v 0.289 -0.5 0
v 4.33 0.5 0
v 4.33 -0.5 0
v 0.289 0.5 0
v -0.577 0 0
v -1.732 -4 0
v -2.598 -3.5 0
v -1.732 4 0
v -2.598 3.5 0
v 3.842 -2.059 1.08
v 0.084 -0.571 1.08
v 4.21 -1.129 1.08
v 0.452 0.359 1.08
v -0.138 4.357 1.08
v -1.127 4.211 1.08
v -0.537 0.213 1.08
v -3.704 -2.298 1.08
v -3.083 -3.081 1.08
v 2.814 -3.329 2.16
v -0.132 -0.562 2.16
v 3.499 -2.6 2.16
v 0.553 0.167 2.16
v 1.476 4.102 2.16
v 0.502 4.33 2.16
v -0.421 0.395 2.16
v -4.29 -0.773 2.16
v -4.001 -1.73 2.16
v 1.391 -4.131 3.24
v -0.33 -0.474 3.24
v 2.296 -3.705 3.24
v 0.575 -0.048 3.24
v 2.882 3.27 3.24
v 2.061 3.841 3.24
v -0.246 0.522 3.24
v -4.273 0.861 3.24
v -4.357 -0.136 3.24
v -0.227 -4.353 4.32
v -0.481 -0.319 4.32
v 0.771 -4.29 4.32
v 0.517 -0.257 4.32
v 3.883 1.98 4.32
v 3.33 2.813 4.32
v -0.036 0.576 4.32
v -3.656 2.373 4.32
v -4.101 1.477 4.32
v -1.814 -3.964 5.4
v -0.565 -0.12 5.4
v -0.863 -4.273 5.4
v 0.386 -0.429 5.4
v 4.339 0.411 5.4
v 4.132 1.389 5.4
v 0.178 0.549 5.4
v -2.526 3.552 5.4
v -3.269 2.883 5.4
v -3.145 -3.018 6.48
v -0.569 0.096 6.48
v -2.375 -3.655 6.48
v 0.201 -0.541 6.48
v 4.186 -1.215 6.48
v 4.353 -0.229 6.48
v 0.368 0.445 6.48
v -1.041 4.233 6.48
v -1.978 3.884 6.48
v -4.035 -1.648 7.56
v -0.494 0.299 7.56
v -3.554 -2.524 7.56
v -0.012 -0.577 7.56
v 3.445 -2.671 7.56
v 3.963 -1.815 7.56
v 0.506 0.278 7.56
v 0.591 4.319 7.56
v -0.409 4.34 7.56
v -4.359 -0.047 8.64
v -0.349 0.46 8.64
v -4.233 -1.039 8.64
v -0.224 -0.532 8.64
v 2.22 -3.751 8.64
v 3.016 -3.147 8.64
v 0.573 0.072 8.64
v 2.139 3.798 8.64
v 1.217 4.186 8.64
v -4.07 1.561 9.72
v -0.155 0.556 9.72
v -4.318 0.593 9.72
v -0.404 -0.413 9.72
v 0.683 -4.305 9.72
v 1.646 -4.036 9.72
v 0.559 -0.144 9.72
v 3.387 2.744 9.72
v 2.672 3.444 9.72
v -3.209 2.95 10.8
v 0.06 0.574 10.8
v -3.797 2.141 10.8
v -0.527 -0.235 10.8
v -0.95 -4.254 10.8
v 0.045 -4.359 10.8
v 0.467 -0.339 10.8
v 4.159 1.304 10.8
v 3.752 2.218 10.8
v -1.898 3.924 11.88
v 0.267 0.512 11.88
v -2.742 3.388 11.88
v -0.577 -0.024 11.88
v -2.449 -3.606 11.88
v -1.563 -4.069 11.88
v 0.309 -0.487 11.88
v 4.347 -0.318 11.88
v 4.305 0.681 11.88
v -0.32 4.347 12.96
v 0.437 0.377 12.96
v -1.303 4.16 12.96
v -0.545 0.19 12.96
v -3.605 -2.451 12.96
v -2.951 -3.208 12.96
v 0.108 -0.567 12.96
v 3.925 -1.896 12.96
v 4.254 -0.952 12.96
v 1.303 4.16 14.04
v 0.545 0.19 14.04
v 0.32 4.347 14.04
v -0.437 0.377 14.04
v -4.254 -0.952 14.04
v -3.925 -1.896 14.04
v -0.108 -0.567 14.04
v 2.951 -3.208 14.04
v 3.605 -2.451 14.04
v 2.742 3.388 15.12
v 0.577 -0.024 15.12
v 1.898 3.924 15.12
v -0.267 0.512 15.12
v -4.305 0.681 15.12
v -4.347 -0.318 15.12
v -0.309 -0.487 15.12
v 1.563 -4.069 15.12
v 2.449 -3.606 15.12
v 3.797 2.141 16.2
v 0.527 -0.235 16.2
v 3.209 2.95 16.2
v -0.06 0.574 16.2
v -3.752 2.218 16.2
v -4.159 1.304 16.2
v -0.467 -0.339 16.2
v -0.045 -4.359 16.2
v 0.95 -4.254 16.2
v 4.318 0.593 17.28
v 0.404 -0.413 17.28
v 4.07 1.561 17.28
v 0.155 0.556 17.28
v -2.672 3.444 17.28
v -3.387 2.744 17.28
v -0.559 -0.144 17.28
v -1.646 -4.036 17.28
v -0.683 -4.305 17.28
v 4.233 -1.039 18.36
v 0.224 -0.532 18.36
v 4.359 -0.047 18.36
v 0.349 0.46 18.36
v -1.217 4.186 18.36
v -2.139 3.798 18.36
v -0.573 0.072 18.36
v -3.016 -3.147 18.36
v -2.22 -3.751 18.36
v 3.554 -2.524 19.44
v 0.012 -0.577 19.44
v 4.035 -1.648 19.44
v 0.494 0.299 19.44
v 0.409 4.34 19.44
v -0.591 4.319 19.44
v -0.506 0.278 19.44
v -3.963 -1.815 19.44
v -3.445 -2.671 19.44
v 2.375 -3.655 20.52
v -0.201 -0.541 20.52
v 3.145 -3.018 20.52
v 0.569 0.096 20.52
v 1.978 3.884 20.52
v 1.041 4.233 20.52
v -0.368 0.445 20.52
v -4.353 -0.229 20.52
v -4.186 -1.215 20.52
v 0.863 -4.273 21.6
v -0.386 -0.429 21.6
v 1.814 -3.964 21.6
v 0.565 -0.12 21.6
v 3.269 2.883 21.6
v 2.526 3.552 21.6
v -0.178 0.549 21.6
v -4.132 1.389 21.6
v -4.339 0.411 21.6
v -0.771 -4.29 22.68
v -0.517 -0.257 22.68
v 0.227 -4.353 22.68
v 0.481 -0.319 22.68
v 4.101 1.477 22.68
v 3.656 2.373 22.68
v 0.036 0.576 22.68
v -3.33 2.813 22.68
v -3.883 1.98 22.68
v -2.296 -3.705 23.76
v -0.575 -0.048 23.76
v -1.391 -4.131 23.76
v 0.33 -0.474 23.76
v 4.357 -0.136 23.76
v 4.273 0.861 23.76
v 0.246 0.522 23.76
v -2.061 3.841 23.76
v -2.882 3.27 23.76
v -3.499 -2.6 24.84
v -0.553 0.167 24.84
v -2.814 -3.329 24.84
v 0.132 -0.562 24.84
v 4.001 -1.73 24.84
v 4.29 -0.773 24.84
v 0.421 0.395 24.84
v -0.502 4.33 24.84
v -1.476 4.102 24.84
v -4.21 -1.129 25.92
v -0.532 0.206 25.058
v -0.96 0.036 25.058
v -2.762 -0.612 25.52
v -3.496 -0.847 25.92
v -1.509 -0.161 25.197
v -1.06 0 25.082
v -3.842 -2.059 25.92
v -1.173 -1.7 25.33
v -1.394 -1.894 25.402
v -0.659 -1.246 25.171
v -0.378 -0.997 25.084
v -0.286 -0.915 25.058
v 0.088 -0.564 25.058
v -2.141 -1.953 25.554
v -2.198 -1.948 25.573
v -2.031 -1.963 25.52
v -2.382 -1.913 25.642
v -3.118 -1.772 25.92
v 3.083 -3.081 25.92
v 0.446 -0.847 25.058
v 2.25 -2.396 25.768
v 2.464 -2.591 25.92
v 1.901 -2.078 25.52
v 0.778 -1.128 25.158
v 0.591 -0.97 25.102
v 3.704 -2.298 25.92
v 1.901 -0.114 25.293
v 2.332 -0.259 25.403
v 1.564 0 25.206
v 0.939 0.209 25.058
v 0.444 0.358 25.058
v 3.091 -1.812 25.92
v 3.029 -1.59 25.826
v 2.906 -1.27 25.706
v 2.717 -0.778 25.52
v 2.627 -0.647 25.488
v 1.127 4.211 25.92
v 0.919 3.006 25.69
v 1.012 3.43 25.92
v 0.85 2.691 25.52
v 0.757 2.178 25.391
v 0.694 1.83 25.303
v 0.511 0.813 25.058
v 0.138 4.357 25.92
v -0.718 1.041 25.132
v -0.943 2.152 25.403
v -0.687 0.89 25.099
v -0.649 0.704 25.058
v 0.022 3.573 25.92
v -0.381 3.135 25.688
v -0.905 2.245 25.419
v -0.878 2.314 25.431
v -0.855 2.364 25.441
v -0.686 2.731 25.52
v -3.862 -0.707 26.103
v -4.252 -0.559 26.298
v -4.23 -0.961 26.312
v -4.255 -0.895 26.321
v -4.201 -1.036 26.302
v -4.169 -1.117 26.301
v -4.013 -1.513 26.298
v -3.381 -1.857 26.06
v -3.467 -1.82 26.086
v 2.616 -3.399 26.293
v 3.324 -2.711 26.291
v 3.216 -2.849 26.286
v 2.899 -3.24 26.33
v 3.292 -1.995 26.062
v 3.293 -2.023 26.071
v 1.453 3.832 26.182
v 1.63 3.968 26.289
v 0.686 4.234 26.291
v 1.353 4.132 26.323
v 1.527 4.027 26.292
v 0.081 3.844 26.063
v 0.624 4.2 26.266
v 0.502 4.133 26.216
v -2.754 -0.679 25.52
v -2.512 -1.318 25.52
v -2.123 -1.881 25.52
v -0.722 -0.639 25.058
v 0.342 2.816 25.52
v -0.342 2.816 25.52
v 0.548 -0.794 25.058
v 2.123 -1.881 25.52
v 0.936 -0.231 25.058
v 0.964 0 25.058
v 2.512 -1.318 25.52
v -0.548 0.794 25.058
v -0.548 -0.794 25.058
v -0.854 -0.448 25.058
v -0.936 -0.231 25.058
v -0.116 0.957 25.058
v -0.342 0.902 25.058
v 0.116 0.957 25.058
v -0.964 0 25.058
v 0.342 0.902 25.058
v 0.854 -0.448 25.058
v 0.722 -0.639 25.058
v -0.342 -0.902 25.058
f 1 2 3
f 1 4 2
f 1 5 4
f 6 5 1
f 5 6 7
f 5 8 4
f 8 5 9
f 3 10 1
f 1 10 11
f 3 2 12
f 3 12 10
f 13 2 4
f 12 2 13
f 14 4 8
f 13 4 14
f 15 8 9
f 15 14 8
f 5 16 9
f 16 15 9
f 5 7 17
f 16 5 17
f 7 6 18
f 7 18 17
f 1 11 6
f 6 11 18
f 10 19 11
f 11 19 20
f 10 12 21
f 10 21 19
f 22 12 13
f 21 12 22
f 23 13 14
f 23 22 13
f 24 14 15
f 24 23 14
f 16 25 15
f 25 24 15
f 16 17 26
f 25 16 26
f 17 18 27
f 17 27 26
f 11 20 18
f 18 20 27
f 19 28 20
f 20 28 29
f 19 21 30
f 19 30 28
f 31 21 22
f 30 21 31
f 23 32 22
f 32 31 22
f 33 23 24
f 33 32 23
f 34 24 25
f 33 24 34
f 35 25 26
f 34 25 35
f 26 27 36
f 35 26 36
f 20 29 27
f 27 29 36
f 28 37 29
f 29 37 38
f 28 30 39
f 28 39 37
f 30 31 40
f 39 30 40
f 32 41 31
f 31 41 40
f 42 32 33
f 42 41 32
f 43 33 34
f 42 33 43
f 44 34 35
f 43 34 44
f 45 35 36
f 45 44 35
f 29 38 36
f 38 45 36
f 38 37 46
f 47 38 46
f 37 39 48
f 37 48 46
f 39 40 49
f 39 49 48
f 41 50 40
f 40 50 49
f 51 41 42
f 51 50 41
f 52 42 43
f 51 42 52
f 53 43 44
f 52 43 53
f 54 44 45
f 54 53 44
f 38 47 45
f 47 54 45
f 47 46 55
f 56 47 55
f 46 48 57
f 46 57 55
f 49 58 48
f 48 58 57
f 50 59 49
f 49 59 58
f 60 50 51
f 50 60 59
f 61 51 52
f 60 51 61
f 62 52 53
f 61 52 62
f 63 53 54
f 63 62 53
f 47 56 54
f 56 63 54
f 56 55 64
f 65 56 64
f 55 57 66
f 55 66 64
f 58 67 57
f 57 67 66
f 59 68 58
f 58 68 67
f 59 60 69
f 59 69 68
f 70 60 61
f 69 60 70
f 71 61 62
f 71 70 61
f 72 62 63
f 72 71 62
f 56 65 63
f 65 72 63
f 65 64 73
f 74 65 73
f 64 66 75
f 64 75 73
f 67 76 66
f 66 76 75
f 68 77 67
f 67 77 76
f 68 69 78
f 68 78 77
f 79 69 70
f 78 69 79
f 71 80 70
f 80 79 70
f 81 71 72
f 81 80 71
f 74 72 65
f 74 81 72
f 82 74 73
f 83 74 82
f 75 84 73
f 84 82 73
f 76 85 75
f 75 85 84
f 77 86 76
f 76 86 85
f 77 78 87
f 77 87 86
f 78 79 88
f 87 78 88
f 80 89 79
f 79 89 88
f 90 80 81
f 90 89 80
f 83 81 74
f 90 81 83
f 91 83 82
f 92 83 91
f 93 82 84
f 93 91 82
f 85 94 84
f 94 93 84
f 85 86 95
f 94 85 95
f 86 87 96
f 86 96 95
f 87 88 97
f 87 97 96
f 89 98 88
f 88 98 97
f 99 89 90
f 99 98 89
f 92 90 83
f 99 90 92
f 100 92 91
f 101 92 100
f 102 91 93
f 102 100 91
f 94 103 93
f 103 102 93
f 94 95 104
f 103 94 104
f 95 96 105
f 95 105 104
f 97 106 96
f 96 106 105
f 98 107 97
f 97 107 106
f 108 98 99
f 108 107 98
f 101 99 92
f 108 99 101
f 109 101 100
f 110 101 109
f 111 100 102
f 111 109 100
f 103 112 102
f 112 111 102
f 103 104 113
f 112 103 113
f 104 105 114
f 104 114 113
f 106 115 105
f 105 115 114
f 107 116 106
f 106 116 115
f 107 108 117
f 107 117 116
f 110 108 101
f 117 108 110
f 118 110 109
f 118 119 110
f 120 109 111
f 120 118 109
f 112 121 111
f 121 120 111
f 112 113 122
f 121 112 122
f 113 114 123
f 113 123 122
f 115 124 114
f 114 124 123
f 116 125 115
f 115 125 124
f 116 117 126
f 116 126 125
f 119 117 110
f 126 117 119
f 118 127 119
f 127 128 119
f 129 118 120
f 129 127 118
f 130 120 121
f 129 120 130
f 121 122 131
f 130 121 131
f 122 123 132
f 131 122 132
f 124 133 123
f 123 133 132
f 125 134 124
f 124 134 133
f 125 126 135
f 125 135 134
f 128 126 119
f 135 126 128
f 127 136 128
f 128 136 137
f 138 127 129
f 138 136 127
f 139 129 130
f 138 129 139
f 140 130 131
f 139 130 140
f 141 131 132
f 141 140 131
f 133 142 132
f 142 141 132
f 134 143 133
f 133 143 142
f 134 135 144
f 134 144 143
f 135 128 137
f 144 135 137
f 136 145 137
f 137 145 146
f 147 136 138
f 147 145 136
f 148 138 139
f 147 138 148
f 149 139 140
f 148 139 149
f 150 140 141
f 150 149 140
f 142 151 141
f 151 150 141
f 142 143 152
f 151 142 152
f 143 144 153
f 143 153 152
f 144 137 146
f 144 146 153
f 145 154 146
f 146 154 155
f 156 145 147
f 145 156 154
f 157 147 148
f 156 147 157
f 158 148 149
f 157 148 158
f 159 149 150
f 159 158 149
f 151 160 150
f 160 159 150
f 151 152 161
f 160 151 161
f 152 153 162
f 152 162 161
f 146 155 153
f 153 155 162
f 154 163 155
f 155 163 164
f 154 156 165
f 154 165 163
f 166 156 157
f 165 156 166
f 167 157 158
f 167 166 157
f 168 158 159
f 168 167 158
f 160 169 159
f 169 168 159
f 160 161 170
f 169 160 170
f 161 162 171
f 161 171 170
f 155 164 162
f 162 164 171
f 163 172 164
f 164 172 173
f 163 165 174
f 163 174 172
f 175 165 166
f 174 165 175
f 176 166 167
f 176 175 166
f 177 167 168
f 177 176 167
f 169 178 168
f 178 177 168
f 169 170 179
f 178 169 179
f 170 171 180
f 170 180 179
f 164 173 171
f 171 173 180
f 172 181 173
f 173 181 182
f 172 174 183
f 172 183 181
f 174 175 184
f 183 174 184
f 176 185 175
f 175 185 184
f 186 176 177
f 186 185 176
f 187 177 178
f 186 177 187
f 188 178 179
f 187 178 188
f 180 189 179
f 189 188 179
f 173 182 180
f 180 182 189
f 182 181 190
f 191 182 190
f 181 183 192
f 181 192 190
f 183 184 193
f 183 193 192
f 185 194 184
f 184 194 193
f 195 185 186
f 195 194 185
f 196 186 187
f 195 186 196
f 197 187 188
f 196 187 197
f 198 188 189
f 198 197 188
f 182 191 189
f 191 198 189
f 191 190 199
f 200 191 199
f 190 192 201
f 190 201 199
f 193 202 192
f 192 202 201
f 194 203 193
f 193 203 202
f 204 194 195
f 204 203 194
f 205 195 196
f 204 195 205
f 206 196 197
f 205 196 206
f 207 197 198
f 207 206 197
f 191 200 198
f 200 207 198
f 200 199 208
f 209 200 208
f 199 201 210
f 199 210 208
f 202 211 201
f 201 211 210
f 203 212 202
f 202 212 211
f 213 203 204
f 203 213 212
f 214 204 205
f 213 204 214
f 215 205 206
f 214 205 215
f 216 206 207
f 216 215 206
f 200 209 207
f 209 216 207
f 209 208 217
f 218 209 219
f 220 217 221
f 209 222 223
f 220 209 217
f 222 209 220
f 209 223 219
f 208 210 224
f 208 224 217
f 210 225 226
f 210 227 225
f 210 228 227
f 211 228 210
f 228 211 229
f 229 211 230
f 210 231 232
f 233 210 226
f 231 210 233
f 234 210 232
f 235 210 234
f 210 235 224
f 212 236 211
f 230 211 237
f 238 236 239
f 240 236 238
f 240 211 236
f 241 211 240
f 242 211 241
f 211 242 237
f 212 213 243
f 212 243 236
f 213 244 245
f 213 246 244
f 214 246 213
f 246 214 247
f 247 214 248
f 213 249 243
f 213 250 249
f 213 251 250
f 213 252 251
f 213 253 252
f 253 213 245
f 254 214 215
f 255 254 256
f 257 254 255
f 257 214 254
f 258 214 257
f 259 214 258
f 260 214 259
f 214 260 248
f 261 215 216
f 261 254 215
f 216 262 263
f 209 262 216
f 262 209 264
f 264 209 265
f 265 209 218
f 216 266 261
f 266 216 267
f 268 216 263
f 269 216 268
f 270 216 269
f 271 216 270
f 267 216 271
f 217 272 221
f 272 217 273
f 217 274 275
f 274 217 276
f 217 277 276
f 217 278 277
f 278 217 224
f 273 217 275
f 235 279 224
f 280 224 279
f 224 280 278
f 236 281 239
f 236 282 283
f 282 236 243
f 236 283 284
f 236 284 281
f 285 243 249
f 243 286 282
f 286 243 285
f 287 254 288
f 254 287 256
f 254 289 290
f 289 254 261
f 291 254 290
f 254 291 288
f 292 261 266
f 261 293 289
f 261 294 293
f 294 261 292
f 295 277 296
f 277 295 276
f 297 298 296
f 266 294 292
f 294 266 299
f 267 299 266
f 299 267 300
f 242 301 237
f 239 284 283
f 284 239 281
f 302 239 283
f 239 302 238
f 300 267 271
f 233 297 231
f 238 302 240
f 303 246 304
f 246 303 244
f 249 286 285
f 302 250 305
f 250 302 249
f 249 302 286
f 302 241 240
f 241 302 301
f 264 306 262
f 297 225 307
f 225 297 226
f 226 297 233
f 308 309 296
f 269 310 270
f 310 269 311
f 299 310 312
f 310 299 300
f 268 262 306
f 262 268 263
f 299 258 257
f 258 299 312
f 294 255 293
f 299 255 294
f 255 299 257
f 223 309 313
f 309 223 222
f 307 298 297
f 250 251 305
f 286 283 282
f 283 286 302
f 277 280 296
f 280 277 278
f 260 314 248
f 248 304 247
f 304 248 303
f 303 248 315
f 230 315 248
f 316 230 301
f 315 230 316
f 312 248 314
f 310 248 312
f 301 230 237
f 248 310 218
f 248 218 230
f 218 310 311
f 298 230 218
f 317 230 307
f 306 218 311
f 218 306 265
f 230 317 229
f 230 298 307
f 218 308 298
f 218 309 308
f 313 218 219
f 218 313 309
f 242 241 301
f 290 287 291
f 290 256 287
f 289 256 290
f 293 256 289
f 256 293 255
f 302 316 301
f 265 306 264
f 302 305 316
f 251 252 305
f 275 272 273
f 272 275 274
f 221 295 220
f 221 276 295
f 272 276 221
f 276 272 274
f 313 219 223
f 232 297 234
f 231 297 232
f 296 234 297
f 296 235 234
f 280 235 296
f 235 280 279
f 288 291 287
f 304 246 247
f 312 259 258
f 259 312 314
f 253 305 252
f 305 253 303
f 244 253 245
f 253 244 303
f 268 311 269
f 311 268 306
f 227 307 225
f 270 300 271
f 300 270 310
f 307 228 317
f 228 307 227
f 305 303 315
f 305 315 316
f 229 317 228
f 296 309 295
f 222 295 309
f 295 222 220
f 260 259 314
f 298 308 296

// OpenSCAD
module pasta()
{
	difference() {
		linear_extrude(height = 27, twist = 360*1.5) {
			rotate([0,30,0]) translate([0,-0.5,0]) square([5,1]);
			rotate([0,30,120]) translate([0,-0.5,0]) square([5,1]);
			rotate([0,30,240]) translate([0,-0.5,0]) square([5,1]);
	}
		translate([0,0,27+6]) sphere(8);
	}
}

pasta();
